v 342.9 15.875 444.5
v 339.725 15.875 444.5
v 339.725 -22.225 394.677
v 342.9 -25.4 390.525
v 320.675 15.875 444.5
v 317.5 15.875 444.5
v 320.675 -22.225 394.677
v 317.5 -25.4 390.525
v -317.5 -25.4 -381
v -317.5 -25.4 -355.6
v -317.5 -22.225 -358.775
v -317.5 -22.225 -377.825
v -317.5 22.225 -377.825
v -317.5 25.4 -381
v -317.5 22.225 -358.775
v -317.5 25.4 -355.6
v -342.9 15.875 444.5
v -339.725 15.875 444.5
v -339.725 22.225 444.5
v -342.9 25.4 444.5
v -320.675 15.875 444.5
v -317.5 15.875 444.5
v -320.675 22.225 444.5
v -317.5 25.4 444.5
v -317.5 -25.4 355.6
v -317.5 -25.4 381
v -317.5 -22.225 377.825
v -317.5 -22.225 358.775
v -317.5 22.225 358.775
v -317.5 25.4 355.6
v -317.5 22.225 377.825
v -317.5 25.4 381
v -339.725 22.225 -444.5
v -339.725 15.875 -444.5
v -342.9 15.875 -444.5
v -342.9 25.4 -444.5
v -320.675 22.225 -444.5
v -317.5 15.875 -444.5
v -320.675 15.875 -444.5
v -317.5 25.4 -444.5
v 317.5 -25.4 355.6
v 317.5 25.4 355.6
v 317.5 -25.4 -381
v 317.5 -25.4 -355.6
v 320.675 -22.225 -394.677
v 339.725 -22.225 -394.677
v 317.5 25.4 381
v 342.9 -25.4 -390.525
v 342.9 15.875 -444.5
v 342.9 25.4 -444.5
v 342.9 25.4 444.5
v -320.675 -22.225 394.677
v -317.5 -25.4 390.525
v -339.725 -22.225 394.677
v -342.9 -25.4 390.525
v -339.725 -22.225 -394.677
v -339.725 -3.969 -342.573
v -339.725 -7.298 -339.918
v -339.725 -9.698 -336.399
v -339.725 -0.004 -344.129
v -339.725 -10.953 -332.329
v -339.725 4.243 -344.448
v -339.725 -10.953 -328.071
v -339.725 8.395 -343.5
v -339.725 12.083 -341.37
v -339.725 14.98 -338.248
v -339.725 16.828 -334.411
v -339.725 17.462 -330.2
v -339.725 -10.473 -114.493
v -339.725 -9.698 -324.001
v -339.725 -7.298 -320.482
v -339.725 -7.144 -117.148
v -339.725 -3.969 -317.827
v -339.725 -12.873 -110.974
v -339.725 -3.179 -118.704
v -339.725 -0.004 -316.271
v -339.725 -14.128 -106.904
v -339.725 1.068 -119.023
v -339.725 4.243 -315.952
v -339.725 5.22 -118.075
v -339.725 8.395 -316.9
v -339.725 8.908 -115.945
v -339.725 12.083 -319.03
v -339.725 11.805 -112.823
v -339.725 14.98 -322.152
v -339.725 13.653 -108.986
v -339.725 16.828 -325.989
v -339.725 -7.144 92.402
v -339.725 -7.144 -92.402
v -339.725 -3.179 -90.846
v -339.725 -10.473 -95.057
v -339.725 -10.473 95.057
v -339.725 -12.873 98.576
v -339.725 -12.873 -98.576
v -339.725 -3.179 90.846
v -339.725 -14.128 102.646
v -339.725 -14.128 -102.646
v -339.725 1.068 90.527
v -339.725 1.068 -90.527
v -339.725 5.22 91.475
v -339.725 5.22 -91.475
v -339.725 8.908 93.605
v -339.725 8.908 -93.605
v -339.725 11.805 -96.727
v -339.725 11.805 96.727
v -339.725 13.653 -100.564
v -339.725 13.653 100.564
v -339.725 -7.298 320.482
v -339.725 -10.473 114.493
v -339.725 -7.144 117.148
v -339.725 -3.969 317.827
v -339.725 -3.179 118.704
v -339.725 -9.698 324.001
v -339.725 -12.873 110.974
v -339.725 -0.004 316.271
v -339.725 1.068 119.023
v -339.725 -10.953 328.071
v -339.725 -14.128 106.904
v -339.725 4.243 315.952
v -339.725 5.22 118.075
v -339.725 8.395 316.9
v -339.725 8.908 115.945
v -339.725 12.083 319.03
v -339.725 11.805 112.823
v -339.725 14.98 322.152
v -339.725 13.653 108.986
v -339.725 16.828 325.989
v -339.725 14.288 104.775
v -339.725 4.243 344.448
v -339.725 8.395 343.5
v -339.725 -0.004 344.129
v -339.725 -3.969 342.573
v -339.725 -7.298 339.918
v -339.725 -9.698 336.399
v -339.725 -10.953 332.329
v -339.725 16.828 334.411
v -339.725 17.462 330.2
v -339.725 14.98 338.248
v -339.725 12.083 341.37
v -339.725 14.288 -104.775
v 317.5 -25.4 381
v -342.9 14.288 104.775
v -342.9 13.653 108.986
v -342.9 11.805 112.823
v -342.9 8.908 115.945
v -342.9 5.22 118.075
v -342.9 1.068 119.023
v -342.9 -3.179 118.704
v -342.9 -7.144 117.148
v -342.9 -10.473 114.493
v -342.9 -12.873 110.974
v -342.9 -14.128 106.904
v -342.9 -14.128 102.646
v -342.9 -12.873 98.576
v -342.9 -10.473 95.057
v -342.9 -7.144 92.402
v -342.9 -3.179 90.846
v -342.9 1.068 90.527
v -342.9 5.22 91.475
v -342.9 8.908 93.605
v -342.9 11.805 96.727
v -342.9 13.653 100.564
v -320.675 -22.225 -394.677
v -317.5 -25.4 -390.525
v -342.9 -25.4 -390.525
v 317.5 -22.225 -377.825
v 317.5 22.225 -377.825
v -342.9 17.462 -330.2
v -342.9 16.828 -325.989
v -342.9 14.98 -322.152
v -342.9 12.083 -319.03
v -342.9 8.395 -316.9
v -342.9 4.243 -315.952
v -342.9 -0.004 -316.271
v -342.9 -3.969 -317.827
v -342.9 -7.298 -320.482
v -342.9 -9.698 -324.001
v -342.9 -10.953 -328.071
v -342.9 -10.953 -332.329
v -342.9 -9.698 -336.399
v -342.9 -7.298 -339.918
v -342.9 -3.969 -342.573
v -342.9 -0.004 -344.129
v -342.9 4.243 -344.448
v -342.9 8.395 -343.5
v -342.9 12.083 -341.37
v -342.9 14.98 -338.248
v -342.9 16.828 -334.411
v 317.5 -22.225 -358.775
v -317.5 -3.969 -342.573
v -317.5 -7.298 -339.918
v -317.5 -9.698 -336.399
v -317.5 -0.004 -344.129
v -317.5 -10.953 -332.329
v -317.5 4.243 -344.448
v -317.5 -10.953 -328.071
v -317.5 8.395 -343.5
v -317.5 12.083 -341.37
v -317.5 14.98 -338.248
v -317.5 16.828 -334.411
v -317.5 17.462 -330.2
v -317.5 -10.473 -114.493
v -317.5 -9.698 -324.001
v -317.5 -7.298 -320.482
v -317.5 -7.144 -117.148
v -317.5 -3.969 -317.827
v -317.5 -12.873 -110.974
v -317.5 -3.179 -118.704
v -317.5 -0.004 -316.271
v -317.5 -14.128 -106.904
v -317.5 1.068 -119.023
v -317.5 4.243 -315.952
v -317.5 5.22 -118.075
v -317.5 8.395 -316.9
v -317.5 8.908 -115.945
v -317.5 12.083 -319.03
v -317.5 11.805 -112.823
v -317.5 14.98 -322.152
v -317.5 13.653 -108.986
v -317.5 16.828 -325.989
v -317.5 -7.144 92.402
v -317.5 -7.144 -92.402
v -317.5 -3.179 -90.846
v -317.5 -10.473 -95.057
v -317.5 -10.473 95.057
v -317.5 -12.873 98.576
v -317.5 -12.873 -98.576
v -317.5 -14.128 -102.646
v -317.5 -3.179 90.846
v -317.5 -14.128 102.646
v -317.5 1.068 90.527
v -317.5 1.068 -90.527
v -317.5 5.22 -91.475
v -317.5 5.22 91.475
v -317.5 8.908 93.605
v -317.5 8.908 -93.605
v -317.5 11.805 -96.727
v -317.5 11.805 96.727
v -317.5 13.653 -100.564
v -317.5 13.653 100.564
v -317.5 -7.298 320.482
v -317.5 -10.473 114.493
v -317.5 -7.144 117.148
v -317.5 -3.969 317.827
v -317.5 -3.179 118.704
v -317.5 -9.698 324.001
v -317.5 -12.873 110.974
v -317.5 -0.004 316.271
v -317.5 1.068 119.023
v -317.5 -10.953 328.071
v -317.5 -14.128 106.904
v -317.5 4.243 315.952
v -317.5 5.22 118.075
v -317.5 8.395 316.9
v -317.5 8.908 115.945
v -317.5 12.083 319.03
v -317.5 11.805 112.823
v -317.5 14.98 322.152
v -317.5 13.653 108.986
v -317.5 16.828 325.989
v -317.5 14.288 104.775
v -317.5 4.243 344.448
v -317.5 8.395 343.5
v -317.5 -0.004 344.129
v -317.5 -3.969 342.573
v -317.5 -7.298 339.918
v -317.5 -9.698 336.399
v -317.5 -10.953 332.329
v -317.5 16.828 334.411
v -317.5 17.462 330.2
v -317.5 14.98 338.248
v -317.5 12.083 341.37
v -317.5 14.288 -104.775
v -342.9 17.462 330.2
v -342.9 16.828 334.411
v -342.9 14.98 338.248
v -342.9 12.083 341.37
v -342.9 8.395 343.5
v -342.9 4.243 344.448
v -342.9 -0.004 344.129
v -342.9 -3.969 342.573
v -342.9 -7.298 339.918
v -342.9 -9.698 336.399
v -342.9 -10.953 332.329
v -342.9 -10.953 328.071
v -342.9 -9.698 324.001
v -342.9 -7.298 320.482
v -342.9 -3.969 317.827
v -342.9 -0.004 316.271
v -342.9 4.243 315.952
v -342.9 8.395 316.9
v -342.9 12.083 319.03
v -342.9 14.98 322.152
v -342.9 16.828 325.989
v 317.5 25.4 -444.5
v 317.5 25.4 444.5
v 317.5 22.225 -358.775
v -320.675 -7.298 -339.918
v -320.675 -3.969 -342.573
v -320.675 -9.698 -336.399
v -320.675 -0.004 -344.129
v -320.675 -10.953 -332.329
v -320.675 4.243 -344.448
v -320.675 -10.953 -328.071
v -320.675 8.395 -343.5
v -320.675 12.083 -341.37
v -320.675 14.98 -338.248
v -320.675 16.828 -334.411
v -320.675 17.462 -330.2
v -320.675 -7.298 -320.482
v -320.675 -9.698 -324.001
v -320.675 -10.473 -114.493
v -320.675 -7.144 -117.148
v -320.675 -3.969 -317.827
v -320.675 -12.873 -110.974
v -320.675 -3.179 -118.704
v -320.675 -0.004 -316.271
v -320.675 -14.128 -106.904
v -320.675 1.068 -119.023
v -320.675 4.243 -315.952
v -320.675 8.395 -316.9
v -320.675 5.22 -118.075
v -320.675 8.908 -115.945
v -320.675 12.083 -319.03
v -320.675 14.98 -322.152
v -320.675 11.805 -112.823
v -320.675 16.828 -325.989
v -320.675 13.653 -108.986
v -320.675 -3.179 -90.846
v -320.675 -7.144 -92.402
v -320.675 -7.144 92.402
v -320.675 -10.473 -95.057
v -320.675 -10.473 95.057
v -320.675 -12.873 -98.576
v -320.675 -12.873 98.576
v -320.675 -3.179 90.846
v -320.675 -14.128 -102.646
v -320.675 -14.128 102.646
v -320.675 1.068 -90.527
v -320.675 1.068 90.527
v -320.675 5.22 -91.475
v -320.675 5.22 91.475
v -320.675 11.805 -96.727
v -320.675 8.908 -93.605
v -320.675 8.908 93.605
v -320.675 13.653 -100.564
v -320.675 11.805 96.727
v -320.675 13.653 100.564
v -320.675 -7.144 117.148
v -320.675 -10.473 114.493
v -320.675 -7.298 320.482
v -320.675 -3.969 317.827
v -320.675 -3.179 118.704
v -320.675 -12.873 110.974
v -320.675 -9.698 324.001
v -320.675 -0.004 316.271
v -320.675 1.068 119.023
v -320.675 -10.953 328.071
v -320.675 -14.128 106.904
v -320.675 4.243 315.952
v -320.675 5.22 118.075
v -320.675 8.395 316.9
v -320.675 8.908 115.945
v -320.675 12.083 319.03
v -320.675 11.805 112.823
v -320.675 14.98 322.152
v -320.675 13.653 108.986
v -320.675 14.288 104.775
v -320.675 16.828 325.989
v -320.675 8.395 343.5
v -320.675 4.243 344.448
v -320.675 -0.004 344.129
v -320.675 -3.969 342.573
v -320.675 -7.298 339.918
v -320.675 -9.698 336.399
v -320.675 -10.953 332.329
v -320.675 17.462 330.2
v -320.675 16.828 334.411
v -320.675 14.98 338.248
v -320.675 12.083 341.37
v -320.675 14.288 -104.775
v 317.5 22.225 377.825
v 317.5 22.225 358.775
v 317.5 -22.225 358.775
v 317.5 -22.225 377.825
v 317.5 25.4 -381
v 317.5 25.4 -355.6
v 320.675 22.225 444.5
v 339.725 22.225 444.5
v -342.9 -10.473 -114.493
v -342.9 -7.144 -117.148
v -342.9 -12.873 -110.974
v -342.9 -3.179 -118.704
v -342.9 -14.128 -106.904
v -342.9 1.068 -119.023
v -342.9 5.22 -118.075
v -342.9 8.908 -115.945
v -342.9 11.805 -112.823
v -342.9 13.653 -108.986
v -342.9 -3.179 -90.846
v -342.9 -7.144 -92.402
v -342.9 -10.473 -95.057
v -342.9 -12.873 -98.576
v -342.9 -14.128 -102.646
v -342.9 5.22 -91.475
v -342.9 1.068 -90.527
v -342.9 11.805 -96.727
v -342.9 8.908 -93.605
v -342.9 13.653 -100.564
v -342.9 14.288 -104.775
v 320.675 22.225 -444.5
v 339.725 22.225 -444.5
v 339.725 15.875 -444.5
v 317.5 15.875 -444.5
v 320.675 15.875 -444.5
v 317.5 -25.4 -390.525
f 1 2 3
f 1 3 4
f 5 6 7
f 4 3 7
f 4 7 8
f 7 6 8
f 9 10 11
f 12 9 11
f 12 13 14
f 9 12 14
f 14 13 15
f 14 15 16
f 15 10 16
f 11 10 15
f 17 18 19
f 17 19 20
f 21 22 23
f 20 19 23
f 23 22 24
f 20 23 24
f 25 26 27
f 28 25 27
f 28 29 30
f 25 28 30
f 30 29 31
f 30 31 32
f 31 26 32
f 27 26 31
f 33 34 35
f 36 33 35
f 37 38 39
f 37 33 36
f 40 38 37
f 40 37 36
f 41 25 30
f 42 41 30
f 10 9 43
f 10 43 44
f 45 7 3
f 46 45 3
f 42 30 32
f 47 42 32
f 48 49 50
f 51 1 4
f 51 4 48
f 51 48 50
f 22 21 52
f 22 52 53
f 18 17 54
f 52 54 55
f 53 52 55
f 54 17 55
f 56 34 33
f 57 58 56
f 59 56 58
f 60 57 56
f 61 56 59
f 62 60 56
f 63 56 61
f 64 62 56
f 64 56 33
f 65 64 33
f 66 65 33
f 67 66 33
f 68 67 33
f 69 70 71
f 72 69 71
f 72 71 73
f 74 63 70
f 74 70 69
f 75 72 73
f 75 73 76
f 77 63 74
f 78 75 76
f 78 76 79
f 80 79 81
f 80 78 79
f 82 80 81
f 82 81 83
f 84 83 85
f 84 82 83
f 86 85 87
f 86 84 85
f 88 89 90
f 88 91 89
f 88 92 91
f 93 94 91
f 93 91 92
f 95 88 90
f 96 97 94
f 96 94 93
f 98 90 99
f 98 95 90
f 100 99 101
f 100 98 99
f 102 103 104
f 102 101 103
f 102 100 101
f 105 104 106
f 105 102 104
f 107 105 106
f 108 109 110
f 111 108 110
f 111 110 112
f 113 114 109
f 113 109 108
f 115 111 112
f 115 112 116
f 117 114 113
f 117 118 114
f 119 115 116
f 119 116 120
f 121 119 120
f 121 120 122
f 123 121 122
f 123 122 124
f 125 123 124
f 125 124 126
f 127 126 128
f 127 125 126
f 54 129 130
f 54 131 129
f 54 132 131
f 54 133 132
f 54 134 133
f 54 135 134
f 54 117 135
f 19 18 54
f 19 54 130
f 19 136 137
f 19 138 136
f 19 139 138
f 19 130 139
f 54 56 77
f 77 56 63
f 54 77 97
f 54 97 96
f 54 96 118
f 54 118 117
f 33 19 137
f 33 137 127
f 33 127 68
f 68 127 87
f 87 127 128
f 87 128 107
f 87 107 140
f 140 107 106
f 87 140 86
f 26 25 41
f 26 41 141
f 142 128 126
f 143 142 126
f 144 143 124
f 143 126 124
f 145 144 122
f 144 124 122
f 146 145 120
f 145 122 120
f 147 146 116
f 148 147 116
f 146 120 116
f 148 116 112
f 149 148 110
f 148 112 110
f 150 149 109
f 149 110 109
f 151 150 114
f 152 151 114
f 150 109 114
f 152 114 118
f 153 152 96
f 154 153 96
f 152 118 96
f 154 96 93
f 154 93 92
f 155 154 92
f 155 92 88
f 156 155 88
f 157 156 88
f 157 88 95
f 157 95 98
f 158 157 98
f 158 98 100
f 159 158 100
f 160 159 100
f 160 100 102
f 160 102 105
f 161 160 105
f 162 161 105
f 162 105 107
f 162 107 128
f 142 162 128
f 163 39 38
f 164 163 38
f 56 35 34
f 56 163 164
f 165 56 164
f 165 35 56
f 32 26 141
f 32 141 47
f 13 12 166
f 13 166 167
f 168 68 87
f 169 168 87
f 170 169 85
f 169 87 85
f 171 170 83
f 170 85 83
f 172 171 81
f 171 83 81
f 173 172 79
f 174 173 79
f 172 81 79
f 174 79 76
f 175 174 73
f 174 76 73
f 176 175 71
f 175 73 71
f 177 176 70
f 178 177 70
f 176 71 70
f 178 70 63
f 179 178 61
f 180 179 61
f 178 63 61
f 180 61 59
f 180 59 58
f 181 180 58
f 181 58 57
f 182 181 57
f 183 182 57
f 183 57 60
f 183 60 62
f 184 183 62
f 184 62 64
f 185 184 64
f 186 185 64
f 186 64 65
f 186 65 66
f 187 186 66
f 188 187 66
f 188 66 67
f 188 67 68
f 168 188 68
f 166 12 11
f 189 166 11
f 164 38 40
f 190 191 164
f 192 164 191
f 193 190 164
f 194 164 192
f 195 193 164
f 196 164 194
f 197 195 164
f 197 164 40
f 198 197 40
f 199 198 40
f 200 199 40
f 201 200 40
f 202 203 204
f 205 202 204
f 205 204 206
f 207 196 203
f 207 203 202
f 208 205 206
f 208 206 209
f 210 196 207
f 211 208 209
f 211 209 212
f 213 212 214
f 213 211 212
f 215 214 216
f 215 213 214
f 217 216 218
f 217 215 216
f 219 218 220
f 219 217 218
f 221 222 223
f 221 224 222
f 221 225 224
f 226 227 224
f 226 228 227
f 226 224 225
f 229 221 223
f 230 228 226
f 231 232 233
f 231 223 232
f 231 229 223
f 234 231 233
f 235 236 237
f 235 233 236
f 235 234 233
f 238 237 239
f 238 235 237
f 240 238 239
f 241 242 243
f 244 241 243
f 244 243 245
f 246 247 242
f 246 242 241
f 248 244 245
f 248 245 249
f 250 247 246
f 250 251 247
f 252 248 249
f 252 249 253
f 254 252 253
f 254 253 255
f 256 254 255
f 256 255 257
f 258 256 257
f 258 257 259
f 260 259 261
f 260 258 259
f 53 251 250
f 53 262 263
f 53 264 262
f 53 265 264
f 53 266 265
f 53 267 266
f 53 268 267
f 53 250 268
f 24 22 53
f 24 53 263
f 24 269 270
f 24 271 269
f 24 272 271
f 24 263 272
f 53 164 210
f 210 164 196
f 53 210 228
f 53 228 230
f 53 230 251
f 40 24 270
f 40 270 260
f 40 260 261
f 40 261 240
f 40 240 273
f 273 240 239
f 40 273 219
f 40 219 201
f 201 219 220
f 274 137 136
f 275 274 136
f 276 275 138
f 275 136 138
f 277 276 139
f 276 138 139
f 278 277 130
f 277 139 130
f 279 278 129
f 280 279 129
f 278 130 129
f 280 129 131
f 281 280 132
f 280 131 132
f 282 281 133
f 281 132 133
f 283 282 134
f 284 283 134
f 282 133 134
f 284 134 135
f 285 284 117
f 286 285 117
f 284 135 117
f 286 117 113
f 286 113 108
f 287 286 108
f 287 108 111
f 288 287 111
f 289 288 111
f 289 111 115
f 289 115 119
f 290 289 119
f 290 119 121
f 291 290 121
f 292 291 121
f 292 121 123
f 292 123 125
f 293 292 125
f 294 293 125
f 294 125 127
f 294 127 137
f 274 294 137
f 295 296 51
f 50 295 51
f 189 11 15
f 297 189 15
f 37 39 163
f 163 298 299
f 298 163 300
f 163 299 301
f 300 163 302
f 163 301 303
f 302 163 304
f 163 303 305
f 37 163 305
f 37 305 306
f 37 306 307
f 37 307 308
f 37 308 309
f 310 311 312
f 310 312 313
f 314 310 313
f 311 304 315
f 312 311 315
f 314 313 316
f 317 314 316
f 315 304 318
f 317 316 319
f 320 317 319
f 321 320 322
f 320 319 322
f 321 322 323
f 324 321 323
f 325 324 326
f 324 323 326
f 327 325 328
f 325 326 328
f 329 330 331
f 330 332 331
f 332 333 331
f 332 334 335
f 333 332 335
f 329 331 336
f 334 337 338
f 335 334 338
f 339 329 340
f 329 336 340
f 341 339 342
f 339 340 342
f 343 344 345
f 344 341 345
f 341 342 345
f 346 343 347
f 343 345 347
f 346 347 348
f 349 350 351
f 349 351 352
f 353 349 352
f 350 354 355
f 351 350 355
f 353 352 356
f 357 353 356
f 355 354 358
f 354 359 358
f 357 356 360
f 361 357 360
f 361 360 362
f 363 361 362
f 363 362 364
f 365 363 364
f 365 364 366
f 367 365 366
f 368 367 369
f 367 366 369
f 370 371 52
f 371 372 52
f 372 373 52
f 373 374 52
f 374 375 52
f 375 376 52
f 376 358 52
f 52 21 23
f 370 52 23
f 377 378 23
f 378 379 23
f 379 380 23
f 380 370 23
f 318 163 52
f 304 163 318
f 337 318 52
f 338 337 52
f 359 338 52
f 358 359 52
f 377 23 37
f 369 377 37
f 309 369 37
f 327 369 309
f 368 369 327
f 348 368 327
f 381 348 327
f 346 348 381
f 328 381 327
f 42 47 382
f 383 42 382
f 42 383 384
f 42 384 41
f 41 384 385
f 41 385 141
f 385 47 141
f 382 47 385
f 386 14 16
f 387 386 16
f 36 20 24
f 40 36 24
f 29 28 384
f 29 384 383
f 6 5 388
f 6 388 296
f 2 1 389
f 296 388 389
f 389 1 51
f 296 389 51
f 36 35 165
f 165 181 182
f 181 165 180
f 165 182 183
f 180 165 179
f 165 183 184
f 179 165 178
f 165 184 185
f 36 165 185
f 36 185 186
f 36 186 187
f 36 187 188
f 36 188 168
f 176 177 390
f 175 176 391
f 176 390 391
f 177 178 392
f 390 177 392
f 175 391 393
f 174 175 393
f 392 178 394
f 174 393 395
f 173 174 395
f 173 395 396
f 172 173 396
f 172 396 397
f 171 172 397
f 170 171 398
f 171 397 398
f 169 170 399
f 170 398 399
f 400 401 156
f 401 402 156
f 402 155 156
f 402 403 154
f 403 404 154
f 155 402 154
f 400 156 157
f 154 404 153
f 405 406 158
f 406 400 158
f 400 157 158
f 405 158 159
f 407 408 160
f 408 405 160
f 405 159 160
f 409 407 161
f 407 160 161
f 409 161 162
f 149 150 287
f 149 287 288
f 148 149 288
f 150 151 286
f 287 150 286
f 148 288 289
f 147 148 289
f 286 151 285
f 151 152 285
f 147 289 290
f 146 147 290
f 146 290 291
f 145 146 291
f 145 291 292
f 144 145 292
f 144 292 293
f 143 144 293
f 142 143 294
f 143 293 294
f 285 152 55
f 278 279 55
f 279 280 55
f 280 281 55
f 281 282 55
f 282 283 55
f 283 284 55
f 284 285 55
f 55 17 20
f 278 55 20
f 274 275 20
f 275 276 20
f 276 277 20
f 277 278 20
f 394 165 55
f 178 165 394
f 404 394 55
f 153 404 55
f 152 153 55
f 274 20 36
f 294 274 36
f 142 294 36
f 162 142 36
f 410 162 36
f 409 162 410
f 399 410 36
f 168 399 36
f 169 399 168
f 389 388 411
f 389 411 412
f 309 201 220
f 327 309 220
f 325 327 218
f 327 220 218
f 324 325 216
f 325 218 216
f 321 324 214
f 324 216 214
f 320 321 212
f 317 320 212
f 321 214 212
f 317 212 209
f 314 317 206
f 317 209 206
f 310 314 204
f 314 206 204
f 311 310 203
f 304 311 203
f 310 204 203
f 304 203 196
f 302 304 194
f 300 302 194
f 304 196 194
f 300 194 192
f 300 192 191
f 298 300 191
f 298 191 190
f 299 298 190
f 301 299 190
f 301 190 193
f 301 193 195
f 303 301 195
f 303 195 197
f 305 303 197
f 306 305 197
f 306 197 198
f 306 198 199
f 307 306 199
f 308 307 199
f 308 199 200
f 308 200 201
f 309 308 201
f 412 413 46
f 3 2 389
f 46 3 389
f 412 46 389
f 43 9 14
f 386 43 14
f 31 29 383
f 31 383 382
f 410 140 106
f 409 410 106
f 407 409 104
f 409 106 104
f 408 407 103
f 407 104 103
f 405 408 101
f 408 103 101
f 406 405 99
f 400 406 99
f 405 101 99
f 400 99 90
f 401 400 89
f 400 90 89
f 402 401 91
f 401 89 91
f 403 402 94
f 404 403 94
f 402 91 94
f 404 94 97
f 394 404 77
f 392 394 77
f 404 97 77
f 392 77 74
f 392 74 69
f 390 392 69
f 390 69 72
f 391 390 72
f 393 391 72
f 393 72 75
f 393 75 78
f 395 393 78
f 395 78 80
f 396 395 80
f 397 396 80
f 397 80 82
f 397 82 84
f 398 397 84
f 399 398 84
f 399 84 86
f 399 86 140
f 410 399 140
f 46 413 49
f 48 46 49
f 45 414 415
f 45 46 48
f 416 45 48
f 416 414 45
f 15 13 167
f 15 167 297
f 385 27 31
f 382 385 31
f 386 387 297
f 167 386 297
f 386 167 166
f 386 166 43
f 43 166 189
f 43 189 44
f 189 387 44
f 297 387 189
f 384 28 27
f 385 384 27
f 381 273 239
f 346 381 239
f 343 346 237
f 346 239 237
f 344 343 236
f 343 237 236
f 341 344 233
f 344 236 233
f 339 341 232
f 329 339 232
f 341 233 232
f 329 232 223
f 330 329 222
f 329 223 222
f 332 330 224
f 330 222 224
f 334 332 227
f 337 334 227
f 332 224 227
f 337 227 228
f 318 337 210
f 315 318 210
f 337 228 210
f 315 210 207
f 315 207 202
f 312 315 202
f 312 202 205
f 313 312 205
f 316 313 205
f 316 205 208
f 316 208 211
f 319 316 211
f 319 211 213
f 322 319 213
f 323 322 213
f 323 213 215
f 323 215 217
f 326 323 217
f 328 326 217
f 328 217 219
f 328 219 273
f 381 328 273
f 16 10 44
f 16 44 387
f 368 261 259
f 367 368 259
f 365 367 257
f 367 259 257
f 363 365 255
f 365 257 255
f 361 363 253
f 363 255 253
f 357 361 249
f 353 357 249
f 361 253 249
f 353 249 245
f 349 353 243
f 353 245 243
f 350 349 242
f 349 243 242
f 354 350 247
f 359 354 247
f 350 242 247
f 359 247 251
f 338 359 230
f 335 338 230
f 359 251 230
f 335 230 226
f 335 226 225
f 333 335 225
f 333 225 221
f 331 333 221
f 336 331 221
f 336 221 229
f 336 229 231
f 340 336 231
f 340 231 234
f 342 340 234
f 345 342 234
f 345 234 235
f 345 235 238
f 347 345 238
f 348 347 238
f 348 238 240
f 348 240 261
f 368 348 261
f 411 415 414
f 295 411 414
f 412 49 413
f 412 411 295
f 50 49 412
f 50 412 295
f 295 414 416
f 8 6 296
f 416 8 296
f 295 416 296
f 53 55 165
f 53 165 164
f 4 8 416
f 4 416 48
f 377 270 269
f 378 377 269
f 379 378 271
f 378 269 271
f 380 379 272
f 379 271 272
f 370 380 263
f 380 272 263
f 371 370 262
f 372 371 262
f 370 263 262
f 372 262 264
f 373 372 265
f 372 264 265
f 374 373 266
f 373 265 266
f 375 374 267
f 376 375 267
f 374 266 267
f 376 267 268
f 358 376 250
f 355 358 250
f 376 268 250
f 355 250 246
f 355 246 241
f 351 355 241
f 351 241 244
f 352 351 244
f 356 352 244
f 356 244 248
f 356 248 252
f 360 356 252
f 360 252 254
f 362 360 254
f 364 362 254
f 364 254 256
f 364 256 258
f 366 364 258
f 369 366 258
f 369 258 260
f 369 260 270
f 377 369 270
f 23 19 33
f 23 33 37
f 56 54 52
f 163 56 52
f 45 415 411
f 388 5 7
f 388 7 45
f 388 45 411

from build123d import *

# Parameters (mm, degrees)
SKETCH12_W                               = 50.8
SKETCH12_H                               = 25.4
SKETCH12_W_2                             = 44.45
SKETCH12_H_2                             = 19.05
RECTANGULAR_TUBE_2_X_1_X_0_125_1_DEPTH   = 889
SKETCH12_ON_SEGMENT_2_W                  = 50.8
SKETCH12_ON_SEGMENT_2_H                  = 25.4
SKETCH12_ON_SEGMENT_2_W_2                = 44.45
SKETCH12_ON_SEGMENT_2_H_2                = 19.05
RECTANGULAR_TUBE_2_X_1_X_0_125_1_2_DEPTH = 889
SKETCH13_W                               = 50.8
SKETCH13_H                               = 25.4
SKETCH13_W_2                             = 44.45
SKETCH13_H_2                             = 19.05
RECTANGULAR_TUBE_2_X_1_X_0_125_2_DEPTH   = 660.4
SKETCH13_ON_SEGMENT_2_W                  = 50.8
SKETCH13_ON_SEGMENT_2_H                  = 25.4
SKETCH13_ON_SEGMENT_2_W_2                = 44.45
SKETCH13_ON_SEGMENT_2_H_2                = 19.05
RECTANGULAR_TUBE_2_X_1_X_0_125_2_2_DEPTH = 660.4
CUT_EXTRUDE1_DEPTH                       = 818.647265023
SKETCH15_R                               = 14.2875
CUT_EXTRUDE2_DEPTH                       = 797.46316299


with BuildPart() as part:
    # Sketch12 → Rectangular tube 2 X 1 X 0.125(1) (new body)
    with BuildSketch(Plane(origin=(-330.2, 0, 444.5), x_dir=(0, 1, 0), z_dir=(0, 0, -1))):
        Rectangle(SKETCH12_W, SKETCH12_H)
        Rectangle(SKETCH12_W_2, SKETCH12_H_2, mode=Mode.SUBTRACT)
    extrude(amount=RECTANGULAR_TUBE_2_X_1_X_0_125_1_DEPTH)


with BuildPart() as body_2:
    # Sketch12 on segment 2 (carried to segment 2) → Rectangular tube 2 X 1 X 0.125_1 2 (new body)
    with BuildSketch(Plane(origin=(330.2, 0, 444.5), x_dir=(0, 1, 0), z_dir=(0, 0, -1))):
        Rectangle(SKETCH12_ON_SEGMENT_2_W, SKETCH12_ON_SEGMENT_2_H)
        Rectangle(SKETCH12_ON_SEGMENT_2_W_2, SKETCH12_ON_SEGMENT_2_H_2, mode=Mode.SUBTRACT)
    extrude(amount=RECTANGULAR_TUBE_2_X_1_X_0_125_1_2_DEPTH)


with BuildPart() as body_3:
    # Sketch13 → Rectangular tube 2 X 1 X 0.125(2) (new body)
    with BuildSketch(Plane(origin=(-330.2, 0, -368.3), x_dir=(0, 1, 0), z_dir=(1, 0, 0))):
        Rectangle(SKETCH13_W, SKETCH13_H)
        Rectangle(SKETCH13_W_2, SKETCH13_H_2, mode=Mode.SUBTRACT)
    extrude(amount=RECTANGULAR_TUBE_2_X_1_X_0_125_2_DEPTH)

    # Trim_Extend1 21
    split(bisect_by=Plane.YZ.offset(-317.5), keep=Keep.TOP)

    # Trim_Extend1 26
    split(bisect_by=Plane(origin=(317.5, 0, 0), x_dir=(0, -1, 0), z_dir=(-1, 0, 0)), keep=Keep.TOP)


with BuildPart() as body_4:
    # Sketch13 on segment 2 (carried to segment 2) → Rectangular tube 2 X 1 X 0.125_2 2 (new body)
    with BuildSketch(Plane(origin=(-330.2, 0, 368.3), x_dir=(0, 1, 0), z_dir=(1, 0, 0))):
        Rectangle(SKETCH13_ON_SEGMENT_2_W, SKETCH13_ON_SEGMENT_2_H)
        Rectangle(SKETCH13_ON_SEGMENT_2_W_2, SKETCH13_ON_SEGMENT_2_H_2, mode=Mode.SUBTRACT)
    extrude(amount=RECTANGULAR_TUBE_2_X_1_X_0_125_2_2_DEPTH)

    # Trim_Extend1 3
    split(bisect_by=Plane.YZ.offset(-317.5), keep=Keep.TOP)

    # Trim_Extend1 26
    split(bisect_by=Plane(origin=(317.5, 0, 0), x_dir=(0, -1, 0), z_dir=(-1, 0, 0)), keep=Keep.TOP)


with BuildPart() as cut_extrude1_tool:
    # Sketch14 → Cut-Extrude1 (new, through all)
    with BuildSketch(Plane.ZY.offset(342.9)):
        Polygon((-444.5, 15.875), (-390.525, -25.4), (-444.5, -25.4), align=None)
        Polygon((444.5, -25.4), (444.5, 15.875), (390.525, -25.4), align=None)
    extrude(amount=-CUT_EXTRUDE1_DEPTH)


with BuildPart() as part_1:
    add(part.part)

    # Cut-Extrude1: cut by cut_extrude1_tool
    add(cut_extrude1_tool.part, mode=Mode.SUBTRACT)

    # Sketch15 → Cut-Extrude2 (cut, through all)
    with BuildSketch(Plane(origin=(-317.5, 0, 0), x_dir=(0, 0, -1), z_dir=(1, 0, 0))):
        with Locations(Location((330.2, 3.175, 0), (0, 0, 90))):
            Circle(SKETCH15_R)
        with Locations(Location((104.775, 0, 0), (0, 0, 90))):
            Circle(SKETCH15_R)
        with Locations(Location((-330.2, 3.175, 0), (0, 0, 90))):
            Circle(SKETCH15_R)
        with Locations(Location((-104.775, 0, 0), (0, 0, 90))):
            Circle(SKETCH15_R)
    extrude(amount=-CUT_EXTRUDE2_DEPTH, mode=Mode.SUBTRACT)


with BuildPart() as body_2_1:
    add(body_2.part)

    # Cut-Extrude1: cut by cut_extrude1_tool
    add(cut_extrude1_tool.part, mode=Mode.SUBTRACT)


solid = Compound([body_3.part, body_4.part, part_1.part, body_2_1.part])
